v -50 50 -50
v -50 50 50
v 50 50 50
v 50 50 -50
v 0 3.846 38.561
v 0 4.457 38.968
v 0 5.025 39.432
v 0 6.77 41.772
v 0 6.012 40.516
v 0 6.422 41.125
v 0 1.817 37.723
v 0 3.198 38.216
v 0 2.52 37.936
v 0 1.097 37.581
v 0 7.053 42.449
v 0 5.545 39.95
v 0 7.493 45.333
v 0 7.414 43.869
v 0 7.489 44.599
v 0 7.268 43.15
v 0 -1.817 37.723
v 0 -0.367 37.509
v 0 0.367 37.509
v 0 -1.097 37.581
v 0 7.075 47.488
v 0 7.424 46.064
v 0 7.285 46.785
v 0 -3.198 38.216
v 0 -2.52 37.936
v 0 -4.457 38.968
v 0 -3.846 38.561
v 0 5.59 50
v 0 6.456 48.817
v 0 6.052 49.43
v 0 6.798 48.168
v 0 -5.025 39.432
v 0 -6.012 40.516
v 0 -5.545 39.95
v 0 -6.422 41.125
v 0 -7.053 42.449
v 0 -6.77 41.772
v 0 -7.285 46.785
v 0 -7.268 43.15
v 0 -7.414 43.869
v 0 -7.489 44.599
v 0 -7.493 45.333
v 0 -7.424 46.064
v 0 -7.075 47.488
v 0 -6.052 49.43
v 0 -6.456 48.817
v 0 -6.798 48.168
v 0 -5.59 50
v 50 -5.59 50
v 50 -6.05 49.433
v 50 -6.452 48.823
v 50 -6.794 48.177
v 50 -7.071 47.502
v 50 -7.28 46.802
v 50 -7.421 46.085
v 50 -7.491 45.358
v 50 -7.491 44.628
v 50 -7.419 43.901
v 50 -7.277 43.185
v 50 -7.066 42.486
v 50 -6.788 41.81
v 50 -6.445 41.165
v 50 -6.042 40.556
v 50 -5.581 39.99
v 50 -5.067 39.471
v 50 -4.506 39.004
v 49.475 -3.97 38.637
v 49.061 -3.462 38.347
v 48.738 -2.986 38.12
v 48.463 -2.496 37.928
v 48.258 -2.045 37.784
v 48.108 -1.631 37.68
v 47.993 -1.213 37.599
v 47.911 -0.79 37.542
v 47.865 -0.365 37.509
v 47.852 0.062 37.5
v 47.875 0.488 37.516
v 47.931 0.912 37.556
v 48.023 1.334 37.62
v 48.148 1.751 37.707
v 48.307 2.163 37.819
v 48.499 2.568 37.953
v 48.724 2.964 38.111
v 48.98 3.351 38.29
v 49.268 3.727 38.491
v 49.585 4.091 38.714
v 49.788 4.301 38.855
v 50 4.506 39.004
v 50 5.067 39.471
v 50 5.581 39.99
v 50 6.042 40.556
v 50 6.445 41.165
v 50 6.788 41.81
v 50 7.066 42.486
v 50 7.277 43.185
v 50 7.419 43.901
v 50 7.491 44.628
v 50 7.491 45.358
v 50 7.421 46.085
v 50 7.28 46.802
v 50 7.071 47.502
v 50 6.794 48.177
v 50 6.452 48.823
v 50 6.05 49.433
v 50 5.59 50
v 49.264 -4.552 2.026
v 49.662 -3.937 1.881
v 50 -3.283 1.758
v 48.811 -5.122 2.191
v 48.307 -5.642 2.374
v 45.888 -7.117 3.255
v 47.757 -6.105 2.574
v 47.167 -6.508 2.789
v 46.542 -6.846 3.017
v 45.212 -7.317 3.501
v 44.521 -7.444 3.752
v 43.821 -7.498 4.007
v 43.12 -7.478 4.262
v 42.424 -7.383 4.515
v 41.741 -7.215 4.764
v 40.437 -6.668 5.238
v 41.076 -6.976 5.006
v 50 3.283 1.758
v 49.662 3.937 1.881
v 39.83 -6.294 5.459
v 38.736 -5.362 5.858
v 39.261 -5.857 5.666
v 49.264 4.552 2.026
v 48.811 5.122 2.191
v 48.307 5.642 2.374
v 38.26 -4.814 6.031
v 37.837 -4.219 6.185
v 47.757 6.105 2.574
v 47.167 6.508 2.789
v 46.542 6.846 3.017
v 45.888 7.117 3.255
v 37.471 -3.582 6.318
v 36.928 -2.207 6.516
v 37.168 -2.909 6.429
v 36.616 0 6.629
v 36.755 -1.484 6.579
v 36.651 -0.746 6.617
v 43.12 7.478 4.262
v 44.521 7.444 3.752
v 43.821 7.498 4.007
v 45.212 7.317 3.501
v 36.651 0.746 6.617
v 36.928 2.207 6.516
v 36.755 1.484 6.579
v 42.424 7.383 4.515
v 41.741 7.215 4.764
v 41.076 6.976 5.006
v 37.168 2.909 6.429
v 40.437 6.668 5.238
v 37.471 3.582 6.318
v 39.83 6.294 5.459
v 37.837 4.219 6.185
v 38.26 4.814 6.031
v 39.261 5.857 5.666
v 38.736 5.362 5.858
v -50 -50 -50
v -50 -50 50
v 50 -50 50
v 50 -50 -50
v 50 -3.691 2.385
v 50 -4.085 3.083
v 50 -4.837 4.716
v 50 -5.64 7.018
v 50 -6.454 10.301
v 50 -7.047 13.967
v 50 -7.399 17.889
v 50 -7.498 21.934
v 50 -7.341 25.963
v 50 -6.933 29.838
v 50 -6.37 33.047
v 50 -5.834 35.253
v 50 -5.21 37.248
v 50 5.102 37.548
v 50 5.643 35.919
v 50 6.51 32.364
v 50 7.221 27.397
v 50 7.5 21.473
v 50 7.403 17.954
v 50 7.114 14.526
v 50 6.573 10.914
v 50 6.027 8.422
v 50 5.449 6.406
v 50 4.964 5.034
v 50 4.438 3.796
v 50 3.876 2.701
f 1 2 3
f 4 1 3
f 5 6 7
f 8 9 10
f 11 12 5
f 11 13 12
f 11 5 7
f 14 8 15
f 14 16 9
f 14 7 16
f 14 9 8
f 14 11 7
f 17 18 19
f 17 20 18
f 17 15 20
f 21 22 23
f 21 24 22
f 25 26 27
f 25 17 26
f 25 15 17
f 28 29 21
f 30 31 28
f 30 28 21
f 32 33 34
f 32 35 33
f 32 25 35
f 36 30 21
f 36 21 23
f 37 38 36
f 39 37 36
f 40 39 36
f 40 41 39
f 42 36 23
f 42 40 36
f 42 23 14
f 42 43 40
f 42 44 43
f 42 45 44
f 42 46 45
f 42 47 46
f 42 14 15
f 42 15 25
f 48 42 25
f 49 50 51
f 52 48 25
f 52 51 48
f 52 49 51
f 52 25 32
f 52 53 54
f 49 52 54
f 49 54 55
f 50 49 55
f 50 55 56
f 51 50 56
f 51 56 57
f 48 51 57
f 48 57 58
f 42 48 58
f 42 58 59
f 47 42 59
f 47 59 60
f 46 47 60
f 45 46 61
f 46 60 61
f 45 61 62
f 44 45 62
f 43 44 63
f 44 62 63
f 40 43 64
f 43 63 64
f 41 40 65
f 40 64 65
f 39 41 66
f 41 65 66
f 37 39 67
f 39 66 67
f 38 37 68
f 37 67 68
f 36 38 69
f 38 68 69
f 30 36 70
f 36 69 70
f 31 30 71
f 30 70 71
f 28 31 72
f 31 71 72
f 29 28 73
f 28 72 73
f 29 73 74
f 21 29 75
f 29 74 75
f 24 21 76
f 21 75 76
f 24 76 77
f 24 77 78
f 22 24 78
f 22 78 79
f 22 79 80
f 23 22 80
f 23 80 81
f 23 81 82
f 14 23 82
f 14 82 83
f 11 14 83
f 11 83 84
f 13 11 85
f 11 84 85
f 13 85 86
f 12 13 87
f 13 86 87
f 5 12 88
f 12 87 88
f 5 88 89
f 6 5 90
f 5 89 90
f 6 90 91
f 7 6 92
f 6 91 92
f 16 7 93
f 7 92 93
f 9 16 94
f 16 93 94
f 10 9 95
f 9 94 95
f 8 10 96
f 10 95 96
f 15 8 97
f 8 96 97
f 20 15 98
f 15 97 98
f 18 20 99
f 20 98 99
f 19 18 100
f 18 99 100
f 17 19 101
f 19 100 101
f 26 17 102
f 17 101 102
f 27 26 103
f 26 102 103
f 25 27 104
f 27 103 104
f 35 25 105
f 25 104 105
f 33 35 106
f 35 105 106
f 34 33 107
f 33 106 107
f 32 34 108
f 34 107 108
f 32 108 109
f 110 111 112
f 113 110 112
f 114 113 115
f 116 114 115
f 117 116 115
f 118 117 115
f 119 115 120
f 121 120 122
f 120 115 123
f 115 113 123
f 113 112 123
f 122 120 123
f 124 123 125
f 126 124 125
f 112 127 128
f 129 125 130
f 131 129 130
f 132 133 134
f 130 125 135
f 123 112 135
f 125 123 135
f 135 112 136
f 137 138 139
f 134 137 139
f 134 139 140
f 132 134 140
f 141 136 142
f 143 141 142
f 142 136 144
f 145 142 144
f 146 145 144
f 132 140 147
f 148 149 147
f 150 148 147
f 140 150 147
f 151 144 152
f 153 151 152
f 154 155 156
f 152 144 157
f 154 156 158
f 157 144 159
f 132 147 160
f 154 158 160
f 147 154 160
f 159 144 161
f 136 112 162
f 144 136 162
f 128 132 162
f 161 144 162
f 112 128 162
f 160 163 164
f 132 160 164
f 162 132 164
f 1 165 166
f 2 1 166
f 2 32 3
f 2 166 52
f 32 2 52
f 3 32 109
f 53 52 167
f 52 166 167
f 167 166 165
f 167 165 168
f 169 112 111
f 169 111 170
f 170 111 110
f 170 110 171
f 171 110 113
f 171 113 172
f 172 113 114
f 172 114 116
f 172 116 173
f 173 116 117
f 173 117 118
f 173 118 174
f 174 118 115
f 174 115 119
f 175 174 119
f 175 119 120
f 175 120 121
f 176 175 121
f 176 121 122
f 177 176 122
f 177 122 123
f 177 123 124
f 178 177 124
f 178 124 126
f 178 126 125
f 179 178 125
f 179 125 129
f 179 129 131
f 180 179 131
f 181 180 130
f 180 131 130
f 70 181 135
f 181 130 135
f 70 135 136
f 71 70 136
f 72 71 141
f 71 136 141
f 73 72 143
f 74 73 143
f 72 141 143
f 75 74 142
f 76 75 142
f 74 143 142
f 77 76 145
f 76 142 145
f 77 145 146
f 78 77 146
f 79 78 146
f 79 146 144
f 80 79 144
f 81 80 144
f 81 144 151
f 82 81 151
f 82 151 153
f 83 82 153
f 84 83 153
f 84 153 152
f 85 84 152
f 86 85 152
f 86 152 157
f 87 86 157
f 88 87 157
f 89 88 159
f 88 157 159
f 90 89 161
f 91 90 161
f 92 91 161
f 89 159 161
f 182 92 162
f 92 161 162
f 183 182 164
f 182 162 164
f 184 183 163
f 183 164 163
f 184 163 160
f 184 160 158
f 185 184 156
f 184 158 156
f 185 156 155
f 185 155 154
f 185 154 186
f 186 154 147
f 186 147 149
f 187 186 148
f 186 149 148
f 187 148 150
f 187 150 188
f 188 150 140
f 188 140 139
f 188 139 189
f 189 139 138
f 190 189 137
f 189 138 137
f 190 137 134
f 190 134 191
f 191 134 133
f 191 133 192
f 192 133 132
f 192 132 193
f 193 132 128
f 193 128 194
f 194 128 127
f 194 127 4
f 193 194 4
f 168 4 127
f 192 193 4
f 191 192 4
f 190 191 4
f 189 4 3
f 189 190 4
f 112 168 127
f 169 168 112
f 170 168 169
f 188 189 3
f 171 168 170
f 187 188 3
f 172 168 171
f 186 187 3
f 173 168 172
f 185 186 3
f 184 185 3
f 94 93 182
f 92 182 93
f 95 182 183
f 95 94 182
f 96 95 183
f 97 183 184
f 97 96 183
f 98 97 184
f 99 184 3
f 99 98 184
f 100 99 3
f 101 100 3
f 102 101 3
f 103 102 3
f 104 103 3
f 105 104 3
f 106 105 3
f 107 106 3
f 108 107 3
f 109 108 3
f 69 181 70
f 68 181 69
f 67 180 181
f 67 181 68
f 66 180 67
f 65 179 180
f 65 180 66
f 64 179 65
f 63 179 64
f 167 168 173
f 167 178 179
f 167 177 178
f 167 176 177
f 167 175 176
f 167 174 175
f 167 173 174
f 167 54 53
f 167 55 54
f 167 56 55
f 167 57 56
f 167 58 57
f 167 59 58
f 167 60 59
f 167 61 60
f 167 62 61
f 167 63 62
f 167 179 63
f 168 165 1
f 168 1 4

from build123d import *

# Parameters (mm, degrees)
F0_W          = 100
F0_H          = 100
F1_DEPTH      = 50
F1_DEPTH_BACK = 50
F3_R          = 7.5


with BuildPart() as f1:
    # F0 (on Front) → F1 (new body, two sides)
    with BuildSketch(Plane.XZ) as f1_sk:
        Rectangle(F0_W, F0_H)
    extrude(amount=F1_DEPTH)
    extrude(f1_sk.sketch, amount=-F1_DEPTH_BACK)

    # F4: sweep along a path in F2
    with BuildLine(Plane.XZ) as f4_path:
        Line((0, 25), (30, 25))
        Line((30, 25), (24.8696978501, 10.9046106882))
    # F3 (on Right) → F4 (sweep, cut)
    with BuildSketch(Plane.YZ):
        with Locations((0, 45)):
            Circle(F3_R)
    sweep(path=f4_path.line, transition=Transition.RIGHT, mode=Mode.SUBTRACT)


solid = f1.part
